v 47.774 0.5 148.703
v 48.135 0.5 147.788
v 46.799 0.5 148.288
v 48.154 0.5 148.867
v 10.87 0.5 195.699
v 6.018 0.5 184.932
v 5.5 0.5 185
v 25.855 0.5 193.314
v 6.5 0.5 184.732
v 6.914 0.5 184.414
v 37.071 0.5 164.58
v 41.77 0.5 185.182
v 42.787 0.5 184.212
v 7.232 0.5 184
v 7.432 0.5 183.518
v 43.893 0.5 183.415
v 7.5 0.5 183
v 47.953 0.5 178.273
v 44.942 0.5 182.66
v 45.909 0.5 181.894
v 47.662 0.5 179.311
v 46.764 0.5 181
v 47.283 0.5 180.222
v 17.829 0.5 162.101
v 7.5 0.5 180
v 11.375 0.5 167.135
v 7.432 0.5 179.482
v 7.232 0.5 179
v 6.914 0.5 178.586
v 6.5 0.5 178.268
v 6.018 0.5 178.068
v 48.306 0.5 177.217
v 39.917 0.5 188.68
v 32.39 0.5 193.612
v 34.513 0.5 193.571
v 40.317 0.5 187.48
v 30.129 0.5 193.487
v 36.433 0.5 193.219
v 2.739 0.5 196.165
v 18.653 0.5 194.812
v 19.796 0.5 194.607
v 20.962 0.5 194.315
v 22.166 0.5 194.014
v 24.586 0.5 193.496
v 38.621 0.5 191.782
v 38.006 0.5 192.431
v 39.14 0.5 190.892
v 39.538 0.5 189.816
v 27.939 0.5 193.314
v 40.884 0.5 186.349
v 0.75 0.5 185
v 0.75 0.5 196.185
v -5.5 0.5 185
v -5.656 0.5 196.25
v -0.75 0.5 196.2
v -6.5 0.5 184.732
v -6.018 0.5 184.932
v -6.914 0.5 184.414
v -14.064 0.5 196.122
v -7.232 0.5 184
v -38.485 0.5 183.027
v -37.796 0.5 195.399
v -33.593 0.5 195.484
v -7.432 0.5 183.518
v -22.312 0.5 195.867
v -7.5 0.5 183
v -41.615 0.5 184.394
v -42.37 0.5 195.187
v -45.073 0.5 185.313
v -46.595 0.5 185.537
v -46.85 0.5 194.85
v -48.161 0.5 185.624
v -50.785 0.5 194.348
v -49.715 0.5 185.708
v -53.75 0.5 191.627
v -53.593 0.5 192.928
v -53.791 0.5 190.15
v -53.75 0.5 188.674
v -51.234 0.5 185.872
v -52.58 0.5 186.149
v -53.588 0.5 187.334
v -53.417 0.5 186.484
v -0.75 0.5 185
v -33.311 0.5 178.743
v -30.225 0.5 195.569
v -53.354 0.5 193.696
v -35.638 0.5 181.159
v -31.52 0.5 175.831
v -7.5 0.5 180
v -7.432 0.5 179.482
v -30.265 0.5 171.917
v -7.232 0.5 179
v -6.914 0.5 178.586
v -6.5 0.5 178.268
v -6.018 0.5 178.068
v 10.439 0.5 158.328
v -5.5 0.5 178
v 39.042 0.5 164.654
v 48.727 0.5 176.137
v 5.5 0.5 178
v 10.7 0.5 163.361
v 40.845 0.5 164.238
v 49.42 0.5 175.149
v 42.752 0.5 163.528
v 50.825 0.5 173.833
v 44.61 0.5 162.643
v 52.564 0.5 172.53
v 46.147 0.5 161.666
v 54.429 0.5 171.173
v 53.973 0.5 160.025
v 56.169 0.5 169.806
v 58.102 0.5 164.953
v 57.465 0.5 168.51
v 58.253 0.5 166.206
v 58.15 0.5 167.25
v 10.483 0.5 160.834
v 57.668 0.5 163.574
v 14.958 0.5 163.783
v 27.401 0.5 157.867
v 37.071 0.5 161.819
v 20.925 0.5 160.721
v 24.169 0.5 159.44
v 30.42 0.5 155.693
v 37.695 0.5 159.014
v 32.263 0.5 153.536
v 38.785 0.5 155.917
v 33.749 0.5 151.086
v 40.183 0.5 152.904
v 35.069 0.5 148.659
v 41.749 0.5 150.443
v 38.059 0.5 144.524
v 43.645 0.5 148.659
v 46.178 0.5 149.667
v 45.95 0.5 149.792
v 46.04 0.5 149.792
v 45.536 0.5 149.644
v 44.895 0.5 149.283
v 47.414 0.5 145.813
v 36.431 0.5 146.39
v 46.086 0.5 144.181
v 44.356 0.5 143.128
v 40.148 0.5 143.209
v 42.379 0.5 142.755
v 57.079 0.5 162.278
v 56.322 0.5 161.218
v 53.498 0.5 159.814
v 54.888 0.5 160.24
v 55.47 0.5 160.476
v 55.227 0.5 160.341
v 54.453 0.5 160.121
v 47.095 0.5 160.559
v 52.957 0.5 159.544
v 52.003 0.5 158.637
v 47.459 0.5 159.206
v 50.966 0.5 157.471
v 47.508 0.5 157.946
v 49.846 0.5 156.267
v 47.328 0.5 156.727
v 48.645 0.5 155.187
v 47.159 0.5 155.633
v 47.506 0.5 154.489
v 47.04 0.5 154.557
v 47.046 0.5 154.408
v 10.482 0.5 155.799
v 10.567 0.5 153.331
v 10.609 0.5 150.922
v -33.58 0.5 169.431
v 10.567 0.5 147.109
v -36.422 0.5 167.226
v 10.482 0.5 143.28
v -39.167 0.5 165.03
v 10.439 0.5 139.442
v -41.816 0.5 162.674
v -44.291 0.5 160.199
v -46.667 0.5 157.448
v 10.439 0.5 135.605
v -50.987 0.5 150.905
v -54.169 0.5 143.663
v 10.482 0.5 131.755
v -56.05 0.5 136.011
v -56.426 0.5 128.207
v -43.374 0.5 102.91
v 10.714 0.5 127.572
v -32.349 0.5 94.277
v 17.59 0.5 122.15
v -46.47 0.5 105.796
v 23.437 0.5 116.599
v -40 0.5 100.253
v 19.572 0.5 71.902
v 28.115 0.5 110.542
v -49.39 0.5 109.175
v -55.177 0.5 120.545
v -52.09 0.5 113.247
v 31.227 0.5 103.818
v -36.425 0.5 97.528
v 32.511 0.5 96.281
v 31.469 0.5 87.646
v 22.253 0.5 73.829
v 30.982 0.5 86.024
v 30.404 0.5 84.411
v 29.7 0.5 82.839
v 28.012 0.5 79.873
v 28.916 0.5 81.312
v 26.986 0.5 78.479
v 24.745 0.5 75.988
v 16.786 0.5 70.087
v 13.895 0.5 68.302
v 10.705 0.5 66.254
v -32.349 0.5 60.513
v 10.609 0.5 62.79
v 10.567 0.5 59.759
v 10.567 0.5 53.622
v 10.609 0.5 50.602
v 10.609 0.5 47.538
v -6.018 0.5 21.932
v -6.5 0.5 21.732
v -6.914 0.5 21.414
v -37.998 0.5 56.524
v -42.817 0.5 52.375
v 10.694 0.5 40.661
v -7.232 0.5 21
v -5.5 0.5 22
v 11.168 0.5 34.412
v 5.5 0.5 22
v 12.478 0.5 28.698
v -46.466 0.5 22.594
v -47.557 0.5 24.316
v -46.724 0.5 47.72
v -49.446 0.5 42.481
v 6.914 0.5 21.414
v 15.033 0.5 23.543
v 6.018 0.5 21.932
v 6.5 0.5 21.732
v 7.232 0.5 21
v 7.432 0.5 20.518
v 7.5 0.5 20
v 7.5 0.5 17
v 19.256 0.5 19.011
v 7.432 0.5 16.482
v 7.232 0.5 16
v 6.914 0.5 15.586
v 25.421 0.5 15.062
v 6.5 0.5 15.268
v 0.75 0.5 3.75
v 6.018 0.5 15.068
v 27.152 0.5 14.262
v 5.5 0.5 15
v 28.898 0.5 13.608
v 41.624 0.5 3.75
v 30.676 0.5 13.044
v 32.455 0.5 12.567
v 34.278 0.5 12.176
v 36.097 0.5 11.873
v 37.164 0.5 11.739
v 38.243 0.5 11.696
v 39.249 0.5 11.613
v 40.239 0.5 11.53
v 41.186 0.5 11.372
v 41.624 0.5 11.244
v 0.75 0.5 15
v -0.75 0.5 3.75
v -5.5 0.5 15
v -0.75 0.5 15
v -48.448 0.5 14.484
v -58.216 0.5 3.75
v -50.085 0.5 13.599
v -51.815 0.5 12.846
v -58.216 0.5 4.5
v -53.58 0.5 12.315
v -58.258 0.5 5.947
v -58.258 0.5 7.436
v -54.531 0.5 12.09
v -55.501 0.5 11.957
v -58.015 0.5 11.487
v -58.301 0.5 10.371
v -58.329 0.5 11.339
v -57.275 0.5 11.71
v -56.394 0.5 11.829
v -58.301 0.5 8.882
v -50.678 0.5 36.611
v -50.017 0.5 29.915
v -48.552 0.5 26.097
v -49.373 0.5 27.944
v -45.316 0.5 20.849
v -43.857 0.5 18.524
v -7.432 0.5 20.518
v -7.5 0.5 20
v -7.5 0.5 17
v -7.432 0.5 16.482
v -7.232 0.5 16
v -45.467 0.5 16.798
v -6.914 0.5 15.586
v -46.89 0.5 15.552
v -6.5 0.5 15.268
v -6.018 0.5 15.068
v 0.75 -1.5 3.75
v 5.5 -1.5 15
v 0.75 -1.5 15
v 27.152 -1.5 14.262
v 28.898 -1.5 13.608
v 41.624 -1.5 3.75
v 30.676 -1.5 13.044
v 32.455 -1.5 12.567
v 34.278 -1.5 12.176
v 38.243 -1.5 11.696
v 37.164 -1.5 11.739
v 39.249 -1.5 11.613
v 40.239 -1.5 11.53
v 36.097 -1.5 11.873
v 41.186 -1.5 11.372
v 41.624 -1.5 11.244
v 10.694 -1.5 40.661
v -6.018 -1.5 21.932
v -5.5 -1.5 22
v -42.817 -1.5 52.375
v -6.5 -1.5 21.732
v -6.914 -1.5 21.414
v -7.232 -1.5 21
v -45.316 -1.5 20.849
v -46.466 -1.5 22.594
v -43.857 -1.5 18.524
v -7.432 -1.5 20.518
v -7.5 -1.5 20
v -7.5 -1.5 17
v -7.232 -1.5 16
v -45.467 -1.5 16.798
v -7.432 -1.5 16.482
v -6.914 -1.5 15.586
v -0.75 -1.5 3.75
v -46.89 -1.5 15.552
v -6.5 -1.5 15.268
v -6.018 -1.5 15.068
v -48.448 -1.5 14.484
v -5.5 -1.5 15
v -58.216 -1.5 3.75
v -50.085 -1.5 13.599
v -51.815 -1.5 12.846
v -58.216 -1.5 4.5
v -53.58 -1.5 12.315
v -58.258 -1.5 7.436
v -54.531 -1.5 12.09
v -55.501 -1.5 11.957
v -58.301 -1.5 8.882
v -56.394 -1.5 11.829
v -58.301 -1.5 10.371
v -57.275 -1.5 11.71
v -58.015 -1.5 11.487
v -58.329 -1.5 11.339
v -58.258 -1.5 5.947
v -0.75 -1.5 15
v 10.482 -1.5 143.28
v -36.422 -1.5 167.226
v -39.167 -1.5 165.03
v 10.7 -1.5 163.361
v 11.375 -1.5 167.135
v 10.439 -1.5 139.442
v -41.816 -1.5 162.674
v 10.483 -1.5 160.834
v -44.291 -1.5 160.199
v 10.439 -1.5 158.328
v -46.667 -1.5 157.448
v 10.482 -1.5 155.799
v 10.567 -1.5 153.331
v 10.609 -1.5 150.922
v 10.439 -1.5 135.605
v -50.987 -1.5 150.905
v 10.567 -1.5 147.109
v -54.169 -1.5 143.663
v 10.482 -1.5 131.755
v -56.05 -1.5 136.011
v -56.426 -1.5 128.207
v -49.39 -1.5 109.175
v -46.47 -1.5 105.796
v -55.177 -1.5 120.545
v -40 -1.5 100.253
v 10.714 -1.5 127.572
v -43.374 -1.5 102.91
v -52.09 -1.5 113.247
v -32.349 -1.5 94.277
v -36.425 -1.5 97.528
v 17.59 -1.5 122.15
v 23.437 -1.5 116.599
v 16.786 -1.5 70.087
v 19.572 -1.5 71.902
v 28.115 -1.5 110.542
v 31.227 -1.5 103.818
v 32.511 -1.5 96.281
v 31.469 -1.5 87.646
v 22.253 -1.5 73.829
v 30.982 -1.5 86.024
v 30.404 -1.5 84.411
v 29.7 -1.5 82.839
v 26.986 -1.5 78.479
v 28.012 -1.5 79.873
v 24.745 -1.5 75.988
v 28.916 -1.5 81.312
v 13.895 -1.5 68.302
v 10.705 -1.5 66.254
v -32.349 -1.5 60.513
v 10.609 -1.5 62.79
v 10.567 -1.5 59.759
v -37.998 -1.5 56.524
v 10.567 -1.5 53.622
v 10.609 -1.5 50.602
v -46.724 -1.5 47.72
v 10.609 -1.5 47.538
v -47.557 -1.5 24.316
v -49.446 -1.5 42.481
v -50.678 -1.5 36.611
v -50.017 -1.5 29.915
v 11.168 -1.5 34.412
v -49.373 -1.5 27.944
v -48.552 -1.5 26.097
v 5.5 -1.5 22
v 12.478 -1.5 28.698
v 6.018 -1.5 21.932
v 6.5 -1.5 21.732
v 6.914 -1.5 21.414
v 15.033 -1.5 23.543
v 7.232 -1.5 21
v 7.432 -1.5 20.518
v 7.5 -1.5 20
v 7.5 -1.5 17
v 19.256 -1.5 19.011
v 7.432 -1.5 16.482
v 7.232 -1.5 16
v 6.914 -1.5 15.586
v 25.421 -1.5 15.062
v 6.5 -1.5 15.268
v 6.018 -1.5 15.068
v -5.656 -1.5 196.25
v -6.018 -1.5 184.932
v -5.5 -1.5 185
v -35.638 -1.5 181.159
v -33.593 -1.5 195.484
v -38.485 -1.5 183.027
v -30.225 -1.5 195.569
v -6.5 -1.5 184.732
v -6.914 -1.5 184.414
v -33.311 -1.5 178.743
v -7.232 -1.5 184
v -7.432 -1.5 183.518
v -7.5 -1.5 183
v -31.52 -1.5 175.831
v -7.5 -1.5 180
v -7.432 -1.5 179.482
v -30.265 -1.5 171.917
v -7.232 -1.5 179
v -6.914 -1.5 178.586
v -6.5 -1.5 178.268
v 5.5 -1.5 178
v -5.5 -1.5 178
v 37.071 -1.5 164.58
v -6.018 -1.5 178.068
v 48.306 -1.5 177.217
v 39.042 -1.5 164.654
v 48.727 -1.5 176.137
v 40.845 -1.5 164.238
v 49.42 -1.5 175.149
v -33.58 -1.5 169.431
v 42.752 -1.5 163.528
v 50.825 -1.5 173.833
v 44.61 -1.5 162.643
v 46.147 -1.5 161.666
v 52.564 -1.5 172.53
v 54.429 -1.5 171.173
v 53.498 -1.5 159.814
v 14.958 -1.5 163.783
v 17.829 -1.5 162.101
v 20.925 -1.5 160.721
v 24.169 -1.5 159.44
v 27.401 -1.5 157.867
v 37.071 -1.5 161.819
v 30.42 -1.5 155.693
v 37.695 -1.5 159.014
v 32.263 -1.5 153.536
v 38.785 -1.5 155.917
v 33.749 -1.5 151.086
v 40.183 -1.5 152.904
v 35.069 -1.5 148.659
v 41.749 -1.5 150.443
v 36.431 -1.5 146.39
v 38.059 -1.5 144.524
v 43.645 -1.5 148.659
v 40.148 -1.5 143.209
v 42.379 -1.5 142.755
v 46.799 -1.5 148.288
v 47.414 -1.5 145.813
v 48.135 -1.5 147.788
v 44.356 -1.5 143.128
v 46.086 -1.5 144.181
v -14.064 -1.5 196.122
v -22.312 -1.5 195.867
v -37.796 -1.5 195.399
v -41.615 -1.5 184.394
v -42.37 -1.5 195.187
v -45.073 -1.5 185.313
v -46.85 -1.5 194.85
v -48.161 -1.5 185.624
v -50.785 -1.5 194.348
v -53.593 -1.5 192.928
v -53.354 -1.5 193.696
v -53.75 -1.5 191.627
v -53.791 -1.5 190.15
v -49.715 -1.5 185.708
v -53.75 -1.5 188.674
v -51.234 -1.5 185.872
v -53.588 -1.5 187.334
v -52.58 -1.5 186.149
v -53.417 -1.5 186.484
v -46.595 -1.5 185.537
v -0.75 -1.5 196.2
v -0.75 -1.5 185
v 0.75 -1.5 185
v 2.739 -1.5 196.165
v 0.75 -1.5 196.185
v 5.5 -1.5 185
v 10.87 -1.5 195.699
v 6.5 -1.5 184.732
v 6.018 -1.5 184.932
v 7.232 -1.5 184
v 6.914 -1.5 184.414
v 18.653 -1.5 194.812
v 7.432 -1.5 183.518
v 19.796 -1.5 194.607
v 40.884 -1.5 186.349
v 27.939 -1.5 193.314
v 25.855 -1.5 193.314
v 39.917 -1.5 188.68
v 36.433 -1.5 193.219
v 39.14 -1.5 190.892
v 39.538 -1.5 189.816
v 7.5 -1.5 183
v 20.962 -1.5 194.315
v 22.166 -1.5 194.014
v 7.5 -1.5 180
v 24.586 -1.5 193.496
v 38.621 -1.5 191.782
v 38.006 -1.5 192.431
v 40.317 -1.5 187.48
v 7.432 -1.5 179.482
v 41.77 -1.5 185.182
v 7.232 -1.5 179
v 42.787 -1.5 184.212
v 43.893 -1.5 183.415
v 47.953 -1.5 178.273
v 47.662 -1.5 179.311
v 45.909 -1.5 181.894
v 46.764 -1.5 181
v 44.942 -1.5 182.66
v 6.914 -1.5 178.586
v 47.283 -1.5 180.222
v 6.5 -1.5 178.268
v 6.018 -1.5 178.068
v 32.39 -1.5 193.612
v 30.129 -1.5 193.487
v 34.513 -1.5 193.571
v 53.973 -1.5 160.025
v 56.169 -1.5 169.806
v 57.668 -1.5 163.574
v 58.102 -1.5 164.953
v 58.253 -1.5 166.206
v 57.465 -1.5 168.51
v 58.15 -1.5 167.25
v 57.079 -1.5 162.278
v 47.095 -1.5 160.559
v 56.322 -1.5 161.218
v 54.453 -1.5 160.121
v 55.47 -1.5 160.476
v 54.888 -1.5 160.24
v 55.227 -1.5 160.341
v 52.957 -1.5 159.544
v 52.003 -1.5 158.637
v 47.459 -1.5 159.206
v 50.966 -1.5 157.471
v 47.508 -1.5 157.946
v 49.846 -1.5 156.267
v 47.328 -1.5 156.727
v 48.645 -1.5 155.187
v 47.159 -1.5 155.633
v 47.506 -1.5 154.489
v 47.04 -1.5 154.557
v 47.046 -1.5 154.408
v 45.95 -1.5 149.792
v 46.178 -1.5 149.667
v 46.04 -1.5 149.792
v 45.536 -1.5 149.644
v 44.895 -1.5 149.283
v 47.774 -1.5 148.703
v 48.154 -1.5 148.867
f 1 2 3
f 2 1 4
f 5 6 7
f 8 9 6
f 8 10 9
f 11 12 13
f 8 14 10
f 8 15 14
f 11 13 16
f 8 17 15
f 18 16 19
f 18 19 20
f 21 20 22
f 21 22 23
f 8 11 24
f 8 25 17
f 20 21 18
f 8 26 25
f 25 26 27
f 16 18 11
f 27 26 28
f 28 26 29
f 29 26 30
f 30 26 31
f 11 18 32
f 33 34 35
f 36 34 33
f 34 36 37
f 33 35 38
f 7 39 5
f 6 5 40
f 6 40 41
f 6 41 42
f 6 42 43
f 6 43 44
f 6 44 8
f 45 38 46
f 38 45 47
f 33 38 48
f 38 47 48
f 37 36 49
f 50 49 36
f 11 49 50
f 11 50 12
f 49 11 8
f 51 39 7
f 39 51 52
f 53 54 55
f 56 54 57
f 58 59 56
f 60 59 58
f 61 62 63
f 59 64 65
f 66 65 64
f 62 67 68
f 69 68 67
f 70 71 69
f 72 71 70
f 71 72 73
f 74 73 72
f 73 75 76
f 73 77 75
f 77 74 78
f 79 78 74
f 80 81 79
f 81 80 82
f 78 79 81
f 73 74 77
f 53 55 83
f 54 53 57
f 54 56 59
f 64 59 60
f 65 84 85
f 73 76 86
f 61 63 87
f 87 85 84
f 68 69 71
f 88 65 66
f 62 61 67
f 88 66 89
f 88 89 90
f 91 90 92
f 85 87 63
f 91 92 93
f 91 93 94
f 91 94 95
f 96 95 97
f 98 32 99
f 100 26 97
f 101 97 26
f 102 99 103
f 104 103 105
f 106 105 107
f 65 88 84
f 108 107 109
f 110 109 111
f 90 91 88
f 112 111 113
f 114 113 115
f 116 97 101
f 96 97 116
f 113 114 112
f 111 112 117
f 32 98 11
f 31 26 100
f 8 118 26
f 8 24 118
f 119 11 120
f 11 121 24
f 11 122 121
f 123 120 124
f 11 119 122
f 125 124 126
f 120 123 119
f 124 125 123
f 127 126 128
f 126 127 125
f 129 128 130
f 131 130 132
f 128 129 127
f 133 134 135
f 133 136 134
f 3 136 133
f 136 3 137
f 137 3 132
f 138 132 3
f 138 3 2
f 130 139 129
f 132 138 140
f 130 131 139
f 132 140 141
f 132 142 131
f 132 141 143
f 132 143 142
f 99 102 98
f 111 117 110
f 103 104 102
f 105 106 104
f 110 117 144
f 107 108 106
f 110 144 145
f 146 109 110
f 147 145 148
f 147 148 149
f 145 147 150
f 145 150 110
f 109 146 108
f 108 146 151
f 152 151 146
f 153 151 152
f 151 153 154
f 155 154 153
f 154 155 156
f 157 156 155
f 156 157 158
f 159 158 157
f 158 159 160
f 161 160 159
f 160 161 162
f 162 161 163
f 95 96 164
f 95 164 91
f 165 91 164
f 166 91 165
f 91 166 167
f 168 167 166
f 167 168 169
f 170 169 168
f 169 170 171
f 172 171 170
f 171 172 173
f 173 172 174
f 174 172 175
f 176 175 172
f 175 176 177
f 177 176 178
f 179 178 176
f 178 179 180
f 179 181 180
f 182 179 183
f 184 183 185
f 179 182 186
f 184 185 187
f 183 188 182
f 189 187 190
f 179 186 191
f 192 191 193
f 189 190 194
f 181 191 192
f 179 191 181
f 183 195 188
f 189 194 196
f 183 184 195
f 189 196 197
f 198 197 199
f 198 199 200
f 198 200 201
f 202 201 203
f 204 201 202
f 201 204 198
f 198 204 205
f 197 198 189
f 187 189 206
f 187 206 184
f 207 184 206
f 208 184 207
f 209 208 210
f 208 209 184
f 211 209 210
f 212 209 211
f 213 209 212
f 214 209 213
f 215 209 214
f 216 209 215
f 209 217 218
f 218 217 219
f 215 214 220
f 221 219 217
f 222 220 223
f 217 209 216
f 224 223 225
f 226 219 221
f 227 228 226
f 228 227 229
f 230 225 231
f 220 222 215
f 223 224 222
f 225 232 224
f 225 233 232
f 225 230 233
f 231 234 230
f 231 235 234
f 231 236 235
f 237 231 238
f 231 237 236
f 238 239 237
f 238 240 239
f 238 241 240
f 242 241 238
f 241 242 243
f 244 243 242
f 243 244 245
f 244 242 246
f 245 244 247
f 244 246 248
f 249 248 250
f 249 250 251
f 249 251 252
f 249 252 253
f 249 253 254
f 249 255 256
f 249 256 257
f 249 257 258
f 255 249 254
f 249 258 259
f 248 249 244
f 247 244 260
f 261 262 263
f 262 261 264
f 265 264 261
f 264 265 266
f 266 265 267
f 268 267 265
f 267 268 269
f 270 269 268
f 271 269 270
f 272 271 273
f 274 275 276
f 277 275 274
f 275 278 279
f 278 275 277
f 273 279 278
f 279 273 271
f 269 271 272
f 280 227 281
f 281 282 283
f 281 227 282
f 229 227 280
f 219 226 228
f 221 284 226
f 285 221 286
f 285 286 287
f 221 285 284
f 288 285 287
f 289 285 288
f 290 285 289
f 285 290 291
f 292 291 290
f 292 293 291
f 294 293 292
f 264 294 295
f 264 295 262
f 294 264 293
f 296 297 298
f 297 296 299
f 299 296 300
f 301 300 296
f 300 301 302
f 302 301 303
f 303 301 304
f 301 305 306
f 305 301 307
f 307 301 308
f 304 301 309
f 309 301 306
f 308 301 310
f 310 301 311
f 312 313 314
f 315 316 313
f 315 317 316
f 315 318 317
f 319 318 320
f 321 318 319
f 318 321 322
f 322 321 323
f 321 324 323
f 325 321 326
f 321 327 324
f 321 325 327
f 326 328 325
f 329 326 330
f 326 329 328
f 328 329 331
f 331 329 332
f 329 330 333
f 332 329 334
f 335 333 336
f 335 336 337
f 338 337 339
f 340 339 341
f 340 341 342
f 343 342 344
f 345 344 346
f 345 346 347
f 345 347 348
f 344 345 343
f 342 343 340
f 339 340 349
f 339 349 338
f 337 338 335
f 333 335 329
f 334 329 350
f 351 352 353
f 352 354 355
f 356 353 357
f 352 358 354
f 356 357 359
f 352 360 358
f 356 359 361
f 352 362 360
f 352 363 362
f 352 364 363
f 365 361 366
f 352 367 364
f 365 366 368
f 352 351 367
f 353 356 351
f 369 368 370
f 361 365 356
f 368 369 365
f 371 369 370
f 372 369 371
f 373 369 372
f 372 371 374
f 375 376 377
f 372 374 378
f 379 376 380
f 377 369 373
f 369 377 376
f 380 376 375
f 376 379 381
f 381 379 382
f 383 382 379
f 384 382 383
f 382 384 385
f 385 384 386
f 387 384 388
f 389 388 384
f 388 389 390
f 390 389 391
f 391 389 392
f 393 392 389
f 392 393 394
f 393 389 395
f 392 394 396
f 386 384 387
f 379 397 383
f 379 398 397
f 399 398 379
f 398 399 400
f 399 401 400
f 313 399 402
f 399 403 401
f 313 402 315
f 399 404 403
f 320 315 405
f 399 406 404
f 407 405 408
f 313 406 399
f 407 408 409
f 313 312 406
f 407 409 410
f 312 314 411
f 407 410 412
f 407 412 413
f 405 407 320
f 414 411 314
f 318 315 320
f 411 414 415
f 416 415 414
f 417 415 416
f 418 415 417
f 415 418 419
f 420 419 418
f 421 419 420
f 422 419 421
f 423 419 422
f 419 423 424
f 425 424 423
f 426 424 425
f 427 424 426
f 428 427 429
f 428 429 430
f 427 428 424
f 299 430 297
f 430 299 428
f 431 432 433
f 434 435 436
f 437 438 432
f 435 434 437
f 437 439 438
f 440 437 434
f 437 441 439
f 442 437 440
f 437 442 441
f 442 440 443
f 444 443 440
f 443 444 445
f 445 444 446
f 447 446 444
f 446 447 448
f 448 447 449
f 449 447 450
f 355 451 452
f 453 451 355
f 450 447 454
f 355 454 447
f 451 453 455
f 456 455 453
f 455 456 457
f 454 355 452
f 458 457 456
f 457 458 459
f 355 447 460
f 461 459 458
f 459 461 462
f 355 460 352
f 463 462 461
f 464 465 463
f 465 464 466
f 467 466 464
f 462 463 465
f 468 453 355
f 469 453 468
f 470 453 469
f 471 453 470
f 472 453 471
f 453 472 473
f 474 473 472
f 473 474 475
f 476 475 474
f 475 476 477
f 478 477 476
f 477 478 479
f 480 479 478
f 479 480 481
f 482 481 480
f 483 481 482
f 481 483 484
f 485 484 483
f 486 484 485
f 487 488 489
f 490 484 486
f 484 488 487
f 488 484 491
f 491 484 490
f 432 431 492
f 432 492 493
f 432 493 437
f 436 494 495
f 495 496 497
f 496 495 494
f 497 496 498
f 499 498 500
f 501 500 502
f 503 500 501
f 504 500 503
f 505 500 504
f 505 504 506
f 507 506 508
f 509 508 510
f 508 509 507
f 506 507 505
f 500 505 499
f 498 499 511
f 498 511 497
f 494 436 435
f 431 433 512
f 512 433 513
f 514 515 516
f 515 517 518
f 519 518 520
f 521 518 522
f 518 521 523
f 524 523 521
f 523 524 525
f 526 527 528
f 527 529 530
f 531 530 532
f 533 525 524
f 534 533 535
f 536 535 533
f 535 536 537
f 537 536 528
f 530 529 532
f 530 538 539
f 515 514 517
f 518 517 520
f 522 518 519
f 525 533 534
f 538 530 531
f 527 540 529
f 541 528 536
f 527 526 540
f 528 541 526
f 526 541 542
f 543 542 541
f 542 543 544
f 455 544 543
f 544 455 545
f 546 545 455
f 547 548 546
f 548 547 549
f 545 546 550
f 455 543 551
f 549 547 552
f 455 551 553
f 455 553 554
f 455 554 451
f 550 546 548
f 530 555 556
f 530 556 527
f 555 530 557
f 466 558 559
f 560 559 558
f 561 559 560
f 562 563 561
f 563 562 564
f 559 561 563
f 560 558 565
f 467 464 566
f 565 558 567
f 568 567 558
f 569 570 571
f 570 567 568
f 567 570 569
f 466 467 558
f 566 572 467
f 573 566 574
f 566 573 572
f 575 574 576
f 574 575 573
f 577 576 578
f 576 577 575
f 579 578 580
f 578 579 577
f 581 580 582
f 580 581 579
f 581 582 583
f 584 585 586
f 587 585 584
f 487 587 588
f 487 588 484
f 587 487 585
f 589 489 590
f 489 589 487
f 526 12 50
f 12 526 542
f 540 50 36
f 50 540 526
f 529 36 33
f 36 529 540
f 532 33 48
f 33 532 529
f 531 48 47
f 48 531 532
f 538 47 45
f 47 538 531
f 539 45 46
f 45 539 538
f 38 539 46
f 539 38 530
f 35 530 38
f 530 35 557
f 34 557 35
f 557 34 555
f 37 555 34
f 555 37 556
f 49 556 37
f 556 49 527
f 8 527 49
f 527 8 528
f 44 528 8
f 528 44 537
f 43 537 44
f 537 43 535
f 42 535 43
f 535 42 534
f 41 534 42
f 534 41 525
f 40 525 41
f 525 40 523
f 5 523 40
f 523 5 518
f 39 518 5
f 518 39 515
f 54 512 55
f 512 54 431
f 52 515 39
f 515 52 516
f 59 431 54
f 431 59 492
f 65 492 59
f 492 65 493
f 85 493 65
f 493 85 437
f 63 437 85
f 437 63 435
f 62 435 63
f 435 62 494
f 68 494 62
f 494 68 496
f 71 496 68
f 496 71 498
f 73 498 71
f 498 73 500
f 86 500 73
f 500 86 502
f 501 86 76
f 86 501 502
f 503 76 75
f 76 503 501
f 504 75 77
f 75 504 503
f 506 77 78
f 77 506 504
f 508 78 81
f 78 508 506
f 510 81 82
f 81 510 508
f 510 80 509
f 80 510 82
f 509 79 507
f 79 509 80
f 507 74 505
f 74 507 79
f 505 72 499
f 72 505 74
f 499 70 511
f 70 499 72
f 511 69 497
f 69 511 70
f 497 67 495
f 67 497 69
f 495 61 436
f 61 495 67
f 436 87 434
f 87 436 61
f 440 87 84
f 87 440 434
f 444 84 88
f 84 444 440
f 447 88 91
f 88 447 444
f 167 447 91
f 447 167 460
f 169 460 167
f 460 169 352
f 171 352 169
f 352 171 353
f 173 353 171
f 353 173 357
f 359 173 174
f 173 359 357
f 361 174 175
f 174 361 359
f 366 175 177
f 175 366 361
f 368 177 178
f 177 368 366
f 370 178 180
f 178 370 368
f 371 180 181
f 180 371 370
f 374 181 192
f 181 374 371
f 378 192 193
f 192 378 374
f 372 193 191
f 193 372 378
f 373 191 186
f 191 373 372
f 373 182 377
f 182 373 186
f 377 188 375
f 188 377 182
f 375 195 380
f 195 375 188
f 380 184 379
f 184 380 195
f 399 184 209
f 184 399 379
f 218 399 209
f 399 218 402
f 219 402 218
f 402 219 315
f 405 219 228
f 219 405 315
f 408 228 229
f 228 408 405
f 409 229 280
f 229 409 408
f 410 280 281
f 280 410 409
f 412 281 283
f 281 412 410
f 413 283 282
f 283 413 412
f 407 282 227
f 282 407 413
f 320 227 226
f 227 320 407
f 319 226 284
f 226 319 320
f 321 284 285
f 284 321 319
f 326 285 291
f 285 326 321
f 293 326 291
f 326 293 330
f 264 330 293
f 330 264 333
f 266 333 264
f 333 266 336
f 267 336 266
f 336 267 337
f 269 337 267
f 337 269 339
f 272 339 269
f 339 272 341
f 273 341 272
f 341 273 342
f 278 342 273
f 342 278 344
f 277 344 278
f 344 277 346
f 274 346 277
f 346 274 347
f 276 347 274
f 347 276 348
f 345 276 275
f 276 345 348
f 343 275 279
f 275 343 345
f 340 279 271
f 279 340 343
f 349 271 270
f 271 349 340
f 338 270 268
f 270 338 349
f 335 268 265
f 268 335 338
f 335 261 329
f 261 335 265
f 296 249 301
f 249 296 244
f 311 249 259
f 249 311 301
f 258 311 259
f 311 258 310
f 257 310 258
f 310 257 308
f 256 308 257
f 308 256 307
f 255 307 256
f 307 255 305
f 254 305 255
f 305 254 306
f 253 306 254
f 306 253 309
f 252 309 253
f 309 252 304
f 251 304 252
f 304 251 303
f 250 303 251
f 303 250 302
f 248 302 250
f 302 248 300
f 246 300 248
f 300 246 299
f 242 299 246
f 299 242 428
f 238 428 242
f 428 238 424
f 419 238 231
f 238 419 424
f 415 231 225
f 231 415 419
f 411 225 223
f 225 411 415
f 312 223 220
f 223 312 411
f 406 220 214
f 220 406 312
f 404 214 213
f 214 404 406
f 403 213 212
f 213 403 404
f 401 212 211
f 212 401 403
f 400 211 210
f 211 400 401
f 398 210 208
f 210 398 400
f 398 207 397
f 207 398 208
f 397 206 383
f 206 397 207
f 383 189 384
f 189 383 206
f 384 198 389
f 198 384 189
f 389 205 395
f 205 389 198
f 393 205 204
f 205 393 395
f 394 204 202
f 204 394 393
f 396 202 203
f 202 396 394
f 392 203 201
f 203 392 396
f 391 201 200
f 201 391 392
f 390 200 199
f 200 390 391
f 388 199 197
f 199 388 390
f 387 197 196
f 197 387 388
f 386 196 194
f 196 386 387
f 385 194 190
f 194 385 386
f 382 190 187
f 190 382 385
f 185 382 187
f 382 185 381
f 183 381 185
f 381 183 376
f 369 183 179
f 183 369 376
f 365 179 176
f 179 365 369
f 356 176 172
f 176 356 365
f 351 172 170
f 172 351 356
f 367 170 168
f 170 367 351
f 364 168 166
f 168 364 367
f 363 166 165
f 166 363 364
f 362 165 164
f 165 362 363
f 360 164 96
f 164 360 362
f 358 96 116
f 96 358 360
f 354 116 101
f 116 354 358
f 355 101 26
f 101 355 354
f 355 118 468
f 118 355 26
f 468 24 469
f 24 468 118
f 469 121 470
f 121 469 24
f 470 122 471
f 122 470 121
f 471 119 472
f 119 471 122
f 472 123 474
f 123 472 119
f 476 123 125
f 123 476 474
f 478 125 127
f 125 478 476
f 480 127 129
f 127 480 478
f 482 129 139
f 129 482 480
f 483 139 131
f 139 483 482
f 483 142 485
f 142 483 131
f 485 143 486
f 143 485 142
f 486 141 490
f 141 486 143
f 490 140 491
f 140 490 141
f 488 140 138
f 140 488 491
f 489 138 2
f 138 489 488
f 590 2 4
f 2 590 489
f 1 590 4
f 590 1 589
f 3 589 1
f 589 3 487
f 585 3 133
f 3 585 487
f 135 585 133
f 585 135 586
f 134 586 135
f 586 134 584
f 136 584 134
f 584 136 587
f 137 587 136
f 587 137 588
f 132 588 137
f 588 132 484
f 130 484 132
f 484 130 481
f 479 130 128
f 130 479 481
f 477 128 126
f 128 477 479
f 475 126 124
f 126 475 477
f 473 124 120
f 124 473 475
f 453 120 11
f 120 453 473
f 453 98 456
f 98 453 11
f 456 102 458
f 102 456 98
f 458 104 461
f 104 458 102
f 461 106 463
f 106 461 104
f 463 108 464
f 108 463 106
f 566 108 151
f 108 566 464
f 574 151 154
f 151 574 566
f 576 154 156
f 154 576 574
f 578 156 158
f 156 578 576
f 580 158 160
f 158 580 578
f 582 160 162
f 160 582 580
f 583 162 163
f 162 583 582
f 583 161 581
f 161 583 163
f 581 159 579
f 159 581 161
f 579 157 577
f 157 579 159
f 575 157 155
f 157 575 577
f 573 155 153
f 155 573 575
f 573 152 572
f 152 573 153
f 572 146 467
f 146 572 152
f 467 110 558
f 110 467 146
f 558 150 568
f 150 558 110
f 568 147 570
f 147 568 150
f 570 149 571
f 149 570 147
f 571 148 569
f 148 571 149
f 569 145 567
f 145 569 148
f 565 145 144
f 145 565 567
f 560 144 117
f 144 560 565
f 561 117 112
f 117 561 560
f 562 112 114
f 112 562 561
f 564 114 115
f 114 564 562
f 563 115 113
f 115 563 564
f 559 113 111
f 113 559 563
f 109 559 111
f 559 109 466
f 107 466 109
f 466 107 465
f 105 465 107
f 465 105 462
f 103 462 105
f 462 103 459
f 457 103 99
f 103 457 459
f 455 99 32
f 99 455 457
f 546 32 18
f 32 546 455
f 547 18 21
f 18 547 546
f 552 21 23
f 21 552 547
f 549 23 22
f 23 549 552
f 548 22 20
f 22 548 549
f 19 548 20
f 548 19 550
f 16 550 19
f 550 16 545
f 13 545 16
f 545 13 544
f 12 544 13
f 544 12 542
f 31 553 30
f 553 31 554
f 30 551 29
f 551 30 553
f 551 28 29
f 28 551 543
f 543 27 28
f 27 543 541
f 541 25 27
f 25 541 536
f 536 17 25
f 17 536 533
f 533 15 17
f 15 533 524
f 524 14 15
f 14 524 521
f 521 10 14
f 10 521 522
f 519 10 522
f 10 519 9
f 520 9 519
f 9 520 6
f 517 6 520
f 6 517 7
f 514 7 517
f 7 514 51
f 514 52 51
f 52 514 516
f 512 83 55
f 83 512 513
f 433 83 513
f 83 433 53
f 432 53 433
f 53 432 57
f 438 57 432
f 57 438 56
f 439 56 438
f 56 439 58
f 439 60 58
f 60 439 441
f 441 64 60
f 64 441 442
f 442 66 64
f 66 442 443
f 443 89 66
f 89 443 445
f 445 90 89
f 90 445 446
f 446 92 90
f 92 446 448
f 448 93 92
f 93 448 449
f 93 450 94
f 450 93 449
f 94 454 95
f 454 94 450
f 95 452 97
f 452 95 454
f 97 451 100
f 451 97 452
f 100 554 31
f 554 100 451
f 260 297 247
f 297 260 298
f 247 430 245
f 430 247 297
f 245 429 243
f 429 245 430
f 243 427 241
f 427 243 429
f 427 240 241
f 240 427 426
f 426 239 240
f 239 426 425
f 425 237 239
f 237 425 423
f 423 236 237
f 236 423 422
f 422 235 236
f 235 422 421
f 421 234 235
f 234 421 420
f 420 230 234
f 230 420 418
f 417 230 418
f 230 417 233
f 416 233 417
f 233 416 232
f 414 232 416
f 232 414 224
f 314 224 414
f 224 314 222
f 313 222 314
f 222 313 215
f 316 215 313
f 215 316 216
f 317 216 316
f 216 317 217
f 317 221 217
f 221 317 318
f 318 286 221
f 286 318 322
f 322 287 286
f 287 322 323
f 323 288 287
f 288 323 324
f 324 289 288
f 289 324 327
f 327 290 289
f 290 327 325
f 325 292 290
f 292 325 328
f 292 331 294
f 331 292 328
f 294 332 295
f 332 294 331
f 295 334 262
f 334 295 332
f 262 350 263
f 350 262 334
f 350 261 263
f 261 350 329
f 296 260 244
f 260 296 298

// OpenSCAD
// file: i_face_grooves.scad
// Front-face snake & DNA relief grooves scaled 1:1 for the 200 mm vertical Snake "I" (0.45 mm relief depth).
i_groove_outer_loops = [
    [[20.42,103.34],[20.04,97.00],[18.18,91.78],[14.07,85.44],[9.78,80.77],[-1.04,72.93],[-21.56,62.49],[-27.16,59.13],[-28.09,59.32],[-28.09,60.81],[-26.59,61.93],[-26.59,67.15],[-26.97,67.53],[-26.97,85.81],[-26.59,86.55],[-28.09,87.68],[-28.09,89.17],[-27.52,89.35],[-26.03,88.60],[-11.85,80.40],[-9.80,79.84],[-27.16,90.84],[-28.09,91.78],[-27.90,93.08],[-27.16,93.08],[-11.49,83.01],[-1.41,75.55],[0.08,75.92],[5.12,79.46],[-1.78,85.99],[-9.99,91.97],[-22.30,102.04],[-30.32,110.06],[-33.31,113.79],[-37.04,121.25],[-38.90,129.46],[-38.90,138.04],[-36.29,148.11],[-32.56,155.57],[-31.07,160.43],[-28.65,162.48],[-27.71,162.66],[-27.71,160.05],[-28.83,155.57],[-34.80,143.26],[-36.67,135.80],[-36.29,124.98],[-35.17,121.25],[-32.75,116.58],[-32.94,122.74],[-32.56,123.11],[-32.56,129.46],[-31.81,133.94],[-29.58,141.02],[-25.47,148.11],[-19.69,154.64],[-9.62,162.48],[-2.91,166.21],[1.57,168.07],[8.29,168.44],[7.73,170.50],[7.73,174.23],[8.47,176.46],[12.21,180.19],[10.90,180.38],[4.93,179.26],[-4.02,175.90],[-12.98,170.68],[-18.20,166.58],[-21.93,162.85],[-23.42,162.48],[-23.98,171.61],[-26.22,176.46],[-28.09,179.08],[-32.00,182.62],[-37.23,185.61],[-44.13,186.91],[-43.57,187.47],[-40.58,187.84],[-36.48,186.73],[-31.26,184.11],[-26.59,179.82],[-23.61,174.60],[-23.05,174.41],[-20.81,176.65],[-14.47,181.13],[-5.14,185.98],[3.81,188.59],[10.16,188.22],[10.53,187.47],[4.56,187.10],[-3.65,184.86],[-14.84,178.89],[-22.87,172.36],[-21.93,165.46],[-14.47,171.80],[-4.02,177.77],[5.68,181.13],[10.16,181.88],[17.05,182.06],[16.50,180.75],[12.76,178.52],[11.46,176.46],[10.71,174.23],[10.71,170.50],[11.84,166.77],[4.37,166.77],[4.75,166.39],[4.75,138.04],[5.12,137.67],[4.75,135.05],[5.12,133.94],[4.75,132.44],[4.75,83.57],[6.80,81.52],[7.54,81.52],[8.85,82.82],[8.85,117.89],[9.78,117.71],[13.14,115.09],[18.55,110.06],[19.67,107.45]],
    [[17.05,186.54],[7.17,184.11],[2.69,182.25],[-3.27,178.89],[-4.58,179.08],[-4.40,180.01],[0.46,182.99],[6.42,185.61],[13.89,187.47],[15.38,187.47]],
    [[24.14,186.17],[23.96,185.61],[20.42,185.42],[20.60,186.35]],
    [[34.22,184.68],[33.29,184.49],[30.86,185.42],[31.05,185.98],[32.16,185.98]],
    [[40.56,170.50],[40.38,169.56],[38.88,169.56],[37.39,170.68],[35.15,170.68],[35.34,169.37],[34.78,168.82],[30.67,168.82],[26.94,170.31],[23.77,173.85],[23.40,178.33],[23.96,179.26],[24.89,179.45],[25.08,180.38],[26.94,180.38],[27.87,180.94],[22.65,181.32],[22.84,182.25],[26.94,182.62],[29.56,182.25],[32.91,180.75],[35.71,178.33],[37.20,176.09],[38.70,171.99]],
    [[24.52,165.65],[24.33,164.72],[23.21,164.72],[20.60,166.21],[18.55,168.26],[16.69,171.61],[17.05,177.59],[19.11,180.38],[20.60,180.75],[20.79,179.82],[18.55,177.21],[17.80,174.97],[17.80,173.11],[19.67,169.37]],
    [[33.47,164.53],[33.29,158.74],[28.43,162.48],[25.27,163.78],[25.45,165.08],[29.18,163.97],[31.42,164.72]],
    [[27.87,94.39],[26.76,90.28],[23.03,84.69],[18.36,80.02],[12.02,75.17],[4.56,70.70],[-4.40,66.22],[-13.72,62.49],[-27.52,55.40],[-28.09,55.59],[-28.09,56.71],[-25.66,58.39],[3.81,72.19],[12.76,77.79],[18.36,82.26],[23.03,87.30],[26.38,93.27],[26.76,95.88],[27.50,95.88]],
    [[24.14,6.34],[15.38,6.16],[15.00,5.78],[11.65,5.78],[11.27,6.16],[-18.57,6.16],[-18.94,6.53],[-27.90,6.16],[-31.26,6.90],[-36.48,8.76],[-40.03,11.19],[-40.03,12.69],[-39.46,12.87],[-32.38,9.14],[-29.76,8.40],[-28.46,8.58],[-32.38,10.63],[-37.41,15.30],[-40.03,19.40],[-41.89,25.37],[-41.52,31.71],[-40.03,35.81],[-37.79,39.54],[-33.12,44.58],[-22.30,52.05],[-11.85,57.27],[1.57,62.49],[6.80,65.10],[6.98,63.79],[6.42,63.24],[-19.69,51.67],[-28.65,46.08],[-33.12,42.34],[-37.79,36.56],[-40.03,31.34],[-40.39,25.37],[-39.65,22.38],[-36.67,16.79],[-32.00,12.13],[-27.90,9.89],[-26.97,8.95],[-26.78,7.65],[-22.30,7.65],[-29.21,14.18],[-32.19,18.65],[-34.05,23.13],[-34.43,29.85],[-33.68,32.83],[-31.81,36.56],[-30.32,38.80],[-26.78,42.34],[-20.07,47.19],[-7.38,54.28],[6.80,61.37],[6.98,59.69],[4.75,58.20],[4.75,49.99],[5.12,49.62],[4.75,47.75],[4.75,19.78],[3.25,16.04],[1.02,13.43],[-2.53,10.26],[-6.45,8.58],[-4.02,7.65],[22.84,7.27]],
    [[-37.04,13.80],[-37.04,13.05],[-37.97,12.87],[-40.03,14.55],[-40.03,15.67],[-39.46,15.85]]
];

i_groove_hole_loops = [
    [[28.62,174.97],[30.30,173.30],[30.86,176.46],[31.61,177.59],[29.56,178.52],[28.62,177.21]],
    [[31.98,172.74],[32.91,172.17],[34.78,172.92],[34.96,174.23],[33.66,175.90]],
    [[-9.80,158.19],[2.69,153.52],[2.88,164.15],[2.32,164.72],[0.83,164.34],[-5.14,161.36]],
    [[-16.14,153.34],[-15.59,152.78],[-5.89,150.16],[-4.40,150.16],[2.69,147.92],[2.88,149.98],[1.57,150.91],[-3.27,152.40],[-11.85,156.14],[-12.98,156.14]],
    [[-23.61,144.38],[-19.69,143.07],[2.69,138.23],[2.88,145.12],[-18.57,150.91],[-21.00,148.48]],
    [[-27.34,137.67],[-6.63,134.87],[-3.27,134.87],[2.69,133.75],[2.88,135.43],[-24.17,141.58],[-25.29,141.58],[-25.85,141.02]],
    [[-29.58,127.22],[-28.27,126.66],[2.69,123.67],[2.88,130.95],[1.95,131.51],[-13.72,133.00],[-27.90,135.24]],
    [[-29.58,119.38],[-26.78,119.20],[-22.30,119.94],[-14.09,120.32],[-10.74,121.06],[-7.38,121.06],[-7.20,121.62],[-29.39,124.05]],
    [[0.27,122.00],[0.83,120.69],[3.44,120.69],[3.62,121.62],[1.95,122.18]],
    [[-29.21,114.53],[-28.09,110.43],[-24.54,106.89],[2.32,110.24],[2.88,110.80],[2.88,119.01],[-3.27,118.82],[-7.38,118.08],[-24.17,116.96],[-24.54,116.58],[-29.02,116.58]],
    [[12.21,86.93],[13.33,87.68],[14.82,89.91],[17.43,94.76],[18.55,98.87],[18.55,102.22],[17.43,106.33],[15.94,109.31],[12.95,113.79],[12.21,114.16]],
    [[-21.74,104.46],[-20.07,102.78],[-9.06,105.58],[-11.85,105.77]],
    [[-16.89,100.36],[-9.99,94.57],[2.69,96.44],[2.88,105.21],[-8.87,102.78],[-16.33,100.92]],
    [[-4.21,90.28],[2.69,84.88],[2.88,91.78]],
    [[-25.10,72.01],[-21.93,71.44],[-7.01,71.82],[-4.96,73.12],[-15.21,79.65],[-24.92,80.40]],
    [[-25.10,63.05],[-24.54,62.86],[-16.89,66.78],[-24.92,66.97]],
    [[-7.94,51.48],[2.69,51.30],[2.88,57.08],[-2.53,54.66]],
    [[0.64,48.50],[2.32,48.32],[3.44,48.68],[3.62,49.25],[0.83,49.43]],
    [[-14.28,48.13],[-8.69,48.50],[-12.60,49.06]],
    [[-25.10,37.31],[-22.68,37.12],[-22.30,37.49],[-17.83,37.49],[-12.60,38.24],[2.69,38.99],[2.88,46.63],[-0.67,46.82],[-1.04,46.45],[-19.69,44.96],[-25.10,41.04]],
    [[-30.70,25.74],[-29.21,20.89],[-26.97,16.42],[-24.73,13.05],[-19.32,8.02],[-15.21,7.27],[-9.06,7.46],[-12.60,8.40],[-15.96,10.26],[-22.87,16.79],[-25.10,20.14],[-26.97,25.00],[-27.16,39.36],[-30.32,35.07],[-29.95,34.70],[-29.95,30.22]],
    [[-25.10,31.34],[2.32,34.88],[2.88,35.44],[2.51,36.94],[3.62,37.31],[0.08,37.49],[0.08,37.12],[1.39,36.94],[1.20,36.00],[-24.92,34.51]],
    [[-25.10,26.86],[-23.61,22.76],[-20.81,19.21],[-5.89,24.07],[2.69,26.30],[2.88,32.09],[0.83,32.27],[-1.78,31.52],[-24.92,28.54]],
    [[-16.14,14.18],[-9.99,9.89],[-7.38,10.26],[-2.53,12.87],[0.64,15.67],[2.51,18.65],[2.88,21.27],[0.08,20.71]],
    [[-19.13,16.79],[-18.20,16.23],[-14.65,17.91],[-15.96,18.09]]
];

module i_face_grooves_mm_2d() {
    difference() {
        union() { for (lp = i_groove_outer_loops) polygon(lp); }
        union() { for (lp = i_groove_hole_loops) polygon(lp); }
    }
}
// file: shape_pts.scad
// Snake "I" (#8, True 1:1 200 mm Height) ? Top X=0 Conduit + Bottom X=0 Conduit + 0.45 mm Face Grooves
// Vertical-display edition: bottom divider clip removed, interlocking hollow double-dovetail channels added.
use <i_face_grooves.scad>

shape_w = 118.10;
shape_h = 194.00;

rec_snap_top_x = -4.00;
rec_snap_top_z = 194.00;
rec_snap_bot_x = -8.00;

rec_top_conn_enable   = true;
rec_top_conn_x        = 0.00;
rec_bot_conn_enable   = true;
rec_bot_conn_x        = 0.00;
rec_left_conn_enable  = false;
rec_left_conn_z       = 0.00;
rec_left_conn_face_x  = 0.00;
rec_left_conn_pocket_x = 0.00;
rec_right_conn_enable = false;
rec_right_conn_z      = 0.00;
rec_right_conn_face_x = 0.00;
rec_right_conn_pocket_x = 0.00;

rec_magnet_enable = true;
rec_magnet_x      = -21.05;
rec_magnet_z      = 122.70;

rec_wall_mount_enable = true;
rec_wall_mount_x      = 0.00;
rec_wall_mount_z      = 92.00;

rec_include_controller = false;
rec_chip_x     = -14.00;
rec_chip_z     = 115.00;
rec_cable_x    = -14.00;
rec_ziptie_z   = 45.00;
rec_keyhole_z  = 31.00;
rec_slit_dir   = 1;

rec_pillars = [[-34.0, 32.0], [16.0, 88.0], [-18.0, 145.0], [24.0, 174.0]];
rec_has_face_grooves = true;

shape_pts = [[47.777,150.775],[49.096,151.584],[50.372,152.732],[51.521,153.966],[52.542,155.115],[53.393,155.923],[53.818,156.136],[54.201,156.306],[54.626,156.391],[55.094,156.519],[55.520,156.646],[55.903,156.859],[56.881,157.710],[57.732,158.901],[58.370,160.305],[58.838,161.794],[59.008,163.198],[58.881,164.475],[58.072,165.964],[56.668,167.368],[54.882,168.771],[53.010,170.133],[51.308,171.409],[49.989,172.643],[49.393,173.494],[49.011,174.472],[48.670,175.493],[48.372,176.557],[47.947,177.578],[47.351,178.471],[46.415,179.450],[45.394,180.258],[44.331,181.024],[43.267,181.790],[42.331,182.683],[41.523,183.747],[41.012,184.768],[40.629,185.917],[40.246,187.065],[39.821,188.214],[39.225,189.235],[38.460,190.043],[36.673,190.937],[34.588,191.320],[32.376,191.362],[30.079,191.235],[27.909,191.064],[25.909,191.064],[24.718,191.235],[23.527,191.490],[22.336,191.745],[21.144,192.043],[19.953,192.341],[18.762,192.554],[10.934,193.447],[2.765,193.915],[-5.658,194.000],[-14.082,193.872],[-22.336,193.617],[-30.249,193.319],[-33.610,193.234],[-37.821,193.149],[-42.416,192.936],[-46.926,192.596],[-50.925,192.086],[-53.946,191.320],[-54.329,190.086],[-54.499,188.682],[-54.541,187.150],[-54.499,185.619],[-54.329,184.215],[-54.073,182.939],[-52.797,182.428],[-51.350,182.130],[-49.776,181.960],[-48.202,181.875],[-46.671,181.790],[-45.224,181.577],[-41.863,180.684],[-38.843,179.365],[-36.120,177.578],[-33.907,175.281],[-32.206,172.515],[-31.142,169.197],[-34.035,167.027],[-36.886,164.815],[-39.651,162.603],[-42.331,160.220],[-44.841,157.710],[-47.266,154.902],[-51.648,148.265],[-54.882,140.905],[-56.796,133.120],[-57.179,125.164],[-55.903,117.336],[-52.754,109.891],[-49.989,105.721],[-47.011,102.275],[-43.863,99.340],[-40.459,96.660],[-36.886,93.937],[-33.099,90.916],[-33.099,85.428],[-33.099,79.897],[-33.099,74.409],[-33.099,68.879],[-33.099,63.390],[-33.099,57.902],[-38.460,54.116],[-43.352,49.904],[-47.351,45.139],[-50.159,39.736],[-51.436,33.652],[-50.755,26.760],[-50.074,24.675],[-49.223,22.761],[-48.202,20.932],[-47.096,19.187],[-45.947,17.443],[-44.799,15.614],[-45.990,14.337],[-47.351,13.146],[-48.840,12.125],[-50.414,11.274],[-52.074,10.551],[-53.775,10.040],[-54.669,9.828],[-55.605,9.700],[-56.498,9.572],[-57.434,9.445],[-58.285,9.189],[-59.093,8.807],[-59.051,7.360],[-59.051,5.871],[-59.008,4.425],[-59.008,2.936],[-58.966,1.489],[-58.966,0.000],[-42.076,0.000],[-25.186,0.000],[-8.296,0.000],[8.594,0.000],[25.484,0.000],[42.374,0.000],[42.374,1.489],[42.374,2.936],[42.374,4.425],[42.374,5.871],[42.374,7.360],[42.374,8.807],[41.353,9.104],[40.332,9.275],[39.311,9.360],[38.289,9.445],[37.226,9.487],[36.205,9.615],[34.418,9.913],[32.631,10.296],[30.887,10.764],[29.143,11.317],[27.441,11.955],[25.782,12.721],[19.740,16.592],[15.656,20.974],[13.189,25.952],[11.912,31.525],[11.444,37.694],[11.359,44.543],[11.359,47.607],[11.317,50.627],[11.317,53.690],[11.317,56.754],[11.359,59.774],[11.444,62.837],[14.295,64.667],[17.188,66.454],[19.996,68.283],[22.718,70.240],[25.271,72.452],[27.568,75.005],[28.632,76.451],[29.568,77.940],[30.376,79.514],[31.100,81.131],[31.695,82.790],[32.206,84.492],[33.269,93.299],[31.950,101.042],[28.760,107.934],[23.995,114.103],[18.081,119.718],[11.444,124.951],[11.232,128.780],[11.189,132.609],[11.189,136.438],[11.232,140.267],[11.317,144.096],[11.359,147.925],[11.317,150.350],[11.232,152.818],[11.189,155.328],[11.232,157.795],[11.444,160.263],[11.870,162.645],[14.507,160.178],[17.486,158.433],[20.634,157.029],[23.867,155.753],[27.015,154.221],[29.908,152.137],[31.653,150.095],[33.099,147.712],[34.418,145.287],[35.822,142.947],[37.566,140.948],[39.864,139.501],[42.374,138.991],[44.629,139.416],[46.586,140.607],[48.075,142.437],[48.883,144.649],[48.925,147.074],[48.628,146.946],[48.330,146.776],[48.075,146.649],[47.777,146.521],[47.479,146.393],[47.181,146.266],[46.798,147.117],[46.330,147.542],[45.820,147.542],[45.224,147.329],[44.543,146.946],[43.778,146.564],[42.331,147.925],[40.842,150.265],[39.481,153.200],[38.417,156.221],[37.821,158.901],[37.821,160.858],[38.970,160.901],[40.629,160.518],[42.459,159.837],[44.246,158.986],[45.650,158.093],[46.415,157.200],[46.713,156.093],[46.756,154.987],[46.586,153.839],[46.415,152.732],[46.288,151.584],[46.330,150.520]];
shape_paths = [[0, 1, 2, 3, 4, 5, 6, 7, 8, 9, 10, 11, 12, 13, 14, 15, 16, 17, 18, 19, 20, 21, 22, 23, 24, 25, 26, 27, 28, 29, 30, 31, 32, 33, 34, 35, 36, 37, 38, 39, 40, 41, 42, 43, 44, 45, 46, 47, 48, 49, 50, 51, 52, 53, 54, 55, 56, 57, 58, 59, 60, 61, 62, 63, 64, 65, 66, 67, 68, 69, 70, 71, 72, 73, 74, 75, 76, 77, 78, 79, 80, 81, 82, 83, 84, 85, 86, 87, 88, 89, 90, 91, 92, 93, 94, 95, 96, 97, 98, 99, 100, 101, 102, 103, 104, 105, 106, 107, 108, 109, 110, 111, 112, 113, 114, 115, 116, 117, 118, 119, 120, 121, 122, 123, 124, 125, 126, 127, 128, 129, 130, 131, 132, 133, 134, 135, 136, 137, 138, 139, 140, 141, 142, 143, 144, 145, 146, 147, 148, 149, 150, 151, 152, 153, 154, 155, 156, 157, 158, 159, 160, 161, 162, 163, 164, 165, 166, 167, 168, 169, 170, 171, 172, 173, 174, 175, 176, 177, 178, 179, 180, 181, 182, 183, 184, 185, 186, 187, 188, 189, 190, 191, 192, 193, 194, 195, 196, 197, 198, 199, 200, 201, 202, 203, 204, 205, 206, 207, 208, 209, 210, 211, 212, 213, 214, 215, 216, 217, 218, 219, 220, 221, 222, 223, 224, 225, 226, 227, 228, 229, 230, 231, 232, 233, 234, 235, 236, 237, 238, 239, 240, 241, 242, 243, 244, 245, 246, 247, 248, 249, 250, 251]];

diffuser_shape_pts = [[47.777,150.775],[49.096,151.584],[50.372,152.732],[51.521,153.966],[52.542,155.115],[53.393,155.923],[53.818,156.136],[54.201,156.306],[54.626,156.391],[55.094,156.519],[55.520,156.646],[55.903,156.859],[56.881,157.710],[57.732,158.901],[58.370,160.305],[58.838,161.794],[59.008,163.198],[58.881,164.475],[58.072,165.964],[56.668,167.368],[54.882,168.771],[53.010,170.133],[51.308,171.409],[49.989,172.643],[49.393,173.494],[49.011,174.472],[48.670,175.493],[48.372,176.557],[47.947,177.578],[47.351,178.471],[46.415,179.450],[45.394,180.258],[44.331,181.024],[43.267,181.790],[42.331,182.683],[41.523,183.747],[41.012,184.768],[40.629,185.917],[40.246,187.065],[39.821,188.214],[39.225,189.235],[38.460,190.043],[36.673,190.937],[34.588,191.320],[32.376,191.362],[30.079,191.235],[27.909,191.064],[25.909,191.064],[24.718,191.235],[23.527,191.490],[22.336,191.745],[21.144,192.043],[19.953,192.341],[18.762,192.554],[10.934,193.447],[2.765,193.915],[-5.658,194.000],[-14.082,193.872],[-22.336,193.617],[-30.249,193.319],[-33.610,193.234],[-37.821,193.149],[-42.416,192.936],[-46.926,192.596],[-50.925,192.086],[-53.946,191.320],[-54.329,190.086],[-54.499,188.682],[-54.541,187.150],[-54.499,185.619],[-54.329,184.215],[-54.073,182.939],[-52.797,182.428],[-51.350,182.130],[-49.776,181.960],[-48.202,181.875],[-46.671,181.790],[-45.224,181.577],[-41.863,180.684],[-38.843,179.365],[-36.120,177.578],[-33.907,175.281],[-32.206,172.515],[-31.142,169.197],[-34.035,167.027],[-36.886,164.815],[-39.651,162.603],[-42.331,160.220],[-44.841,157.710],[-47.266,154.902],[-51.648,148.265],[-54.882,140.905],[-56.796,133.120],[-57.179,125.164],[-55.903,117.336],[-52.754,109.891],[-49.989,105.721],[-47.011,102.275],[-43.863,99.340],[-40.459,96.660],[-36.886,93.937],[-33.099,90.916],[-33.099,85.428],[-33.099,79.897],[-33.099,74.409],[-33.099,68.879],[-33.099,63.390],[-33.099,57.902],[-38.460,54.116],[-43.352,49.904],[-47.351,45.139],[-50.159,39.736],[-51.436,33.652],[-50.755,26.760],[-50.074,24.675],[-49.223,22.761],[-48.202,20.932],[-47.096,19.187],[-45.947,17.443],[-44.799,15.614],[-45.990,14.337],[-47.351,13.146],[-48.840,12.125],[-50.414,11.274],[-52.074,10.551],[-53.775,10.040],[-54.669,9.828],[-55.605,9.700],[-56.498,9.572],[-57.434,9.445],[-58.285,9.189],[-59.093,8.807],[-59.051,7.360],[-59.051,5.871],[-59.008,4.425],[-59.008,2.936],[-58.966,1.489],[-58.966,0.000],[-42.076,0.000],[-25.186,0.000],[-8.296,0.000],[8.594,0.000],[25.484,0.000],[42.374,0.000],[42.374,1.489],[42.374,2.936],[42.374,4.425],[42.374,5.871],[42.374,7.360],[42.374,8.807],[41.353,9.104],[40.332,9.275],[39.311,9.360],[38.289,9.445],[37.226,9.487],[36.205,9.615],[34.418,9.913],[32.631,10.296],[30.887,10.764],[29.143,11.317],[27.441,11.955],[25.782,12.721],[19.740,16.592],[15.656,20.974],[13.189,25.952],[11.912,31.525],[11.444,37.694],[11.359,44.543],[11.359,47.607],[11.317,50.627],[11.317,53.690],[11.317,56.754],[11.359,59.774],[11.444,62.837],[14.295,64.667],[17.188,66.454],[19.996,68.283],[22.718,70.240],[25.271,72.452],[27.568,75.005],[28.632,76.451],[29.568,77.940],[30.376,79.514],[31.100,81.131],[31.695,82.790],[32.206,84.492],[33.269,93.299],[31.950,101.042],[28.760,107.934],[23.995,114.103],[18.081,119.718],[11.444,124.951],[11.232,128.780],[11.189,132.609],[11.189,136.438],[11.232,140.267],[11.317,144.096],[11.359,147.925],[11.317,150.350],[11.232,152.818],[11.189,155.328],[11.232,157.795],[11.444,160.263],[11.870,162.645],[14.507,160.178],[17.486,158.433],[20.634,157.029],[23.867,155.753],[27.015,154.221],[29.908,152.137],[31.653,150.095],[33.099,147.712],[34.418,145.287],[35.822,142.947],[37.566,140.948],[39.864,139.501],[42.374,138.991],[44.629,139.416],[46.586,140.607],[48.075,142.437],[48.883,144.649],[48.925,147.074],[48.628,146.946],[48.330,146.776],[48.075,146.649],[47.777,146.521],[47.479,146.393],[47.181,146.266],[46.798,147.117],[46.330,147.542],[45.820,147.542],[45.224,147.329],[44.543,146.946],[43.778,146.564],[42.331,147.925],[40.842,150.265],[39.481,153.200],[38.417,156.221],[37.821,158.901],[37.821,160.858],[38.970,160.901],[40.629,160.518],[42.459,159.837],[44.246,158.986],[45.650,158.093],[46.415,157.200],[46.713,156.093],[46.756,154.987],[46.586,153.839],[46.415,152.732],[46.288,151.584],[46.330,150.520]];
diffuser_shape_paths = [[0, 1, 2, 3, 4, 5, 6, 7, 8, 9, 10, 11, 12, 13, 14, 15, 16, 17, 18, 19, 20, 21, 22, 23, 24, 25, 26, 27, 28, 29, 30, 31, 32, 33, 34, 35, 36, 37, 38, 39, 40, 41, 42, 43, 44, 45, 46, 47, 48, 49, 50, 51, 52, 53, 54, 55, 56, 57, 58, 59, 60, 61, 62, 63, 64, 65, 66, 67, 68, 69, 70, 71, 72, 73, 74, 75, 76, 77, 78, 79, 80, 81, 82, 83, 84, 85, 86, 87, 88, 89, 90, 91, 92, 93, 94, 95, 96, 97, 98, 99, 100, 101, 102, 103, 104, 105, 106, 107, 108, 109, 110, 111, 112, 113, 114, 115, 116, 117, 118, 119, 120, 121, 122, 123, 124, 125, 126, 127, 128, 129, 130, 131, 132, 133, 134, 135, 136, 137, 138, 139, 140, 141, 142, 143, 144, 145, 146, 147, 148, 149, 150, 151, 152, 153, 154, 155, 156, 157, 158, 159, 160, 161, 162, 163, 164, 165, 166, 167, 168, 169, 170, 171, 172, 173, 174, 175, 176, 177, 178, 179, 180, 181, 182, 183, 184, 185, 186, 187, 188, 189, 190, 191, 192, 193, 194, 195, 196, 197, 198, 199, 200, 201, 202, 203, 204, 205, 206, 207, 208, 209, 210, 211, 212, 213, 214, 215, 216, 217, 218, 219, 220, 221, 222, 223, 224, 225, 226, 227, 228, 229, 230, 231, 232, 233, 234, 235, 236, 237, 238, 239, 240, 241, 242, 243, 244, 245, 246, 247, 248, 249, 250, 251]];

module shape_2d(pts = shape_pts) {
    polygon(points = pts, paths = shape_paths);
}

module diffuser_shape_2d(pts = diffuser_shape_pts) {
    polygon(points = pts, paths = diffuser_shape_paths);
}

module diffuser_face_grooves_2d() { i_face_grooves_mm_2d(); }
// main file
// Snake "I" (#8, True 1:1 200 mm Height) ? Top X=0 Conduit + Bottom X=0 Conduit + 0.45 mm Face Grooves ? internal white reflector plate (2.00 mm thick, aligned LED-strip conduit pockets + entry slits)
// Opens and exports standalone in OpenSCAD / OpenSCAD.js.

use <lamp_core.scad>

render_lamp_part("reflector");
